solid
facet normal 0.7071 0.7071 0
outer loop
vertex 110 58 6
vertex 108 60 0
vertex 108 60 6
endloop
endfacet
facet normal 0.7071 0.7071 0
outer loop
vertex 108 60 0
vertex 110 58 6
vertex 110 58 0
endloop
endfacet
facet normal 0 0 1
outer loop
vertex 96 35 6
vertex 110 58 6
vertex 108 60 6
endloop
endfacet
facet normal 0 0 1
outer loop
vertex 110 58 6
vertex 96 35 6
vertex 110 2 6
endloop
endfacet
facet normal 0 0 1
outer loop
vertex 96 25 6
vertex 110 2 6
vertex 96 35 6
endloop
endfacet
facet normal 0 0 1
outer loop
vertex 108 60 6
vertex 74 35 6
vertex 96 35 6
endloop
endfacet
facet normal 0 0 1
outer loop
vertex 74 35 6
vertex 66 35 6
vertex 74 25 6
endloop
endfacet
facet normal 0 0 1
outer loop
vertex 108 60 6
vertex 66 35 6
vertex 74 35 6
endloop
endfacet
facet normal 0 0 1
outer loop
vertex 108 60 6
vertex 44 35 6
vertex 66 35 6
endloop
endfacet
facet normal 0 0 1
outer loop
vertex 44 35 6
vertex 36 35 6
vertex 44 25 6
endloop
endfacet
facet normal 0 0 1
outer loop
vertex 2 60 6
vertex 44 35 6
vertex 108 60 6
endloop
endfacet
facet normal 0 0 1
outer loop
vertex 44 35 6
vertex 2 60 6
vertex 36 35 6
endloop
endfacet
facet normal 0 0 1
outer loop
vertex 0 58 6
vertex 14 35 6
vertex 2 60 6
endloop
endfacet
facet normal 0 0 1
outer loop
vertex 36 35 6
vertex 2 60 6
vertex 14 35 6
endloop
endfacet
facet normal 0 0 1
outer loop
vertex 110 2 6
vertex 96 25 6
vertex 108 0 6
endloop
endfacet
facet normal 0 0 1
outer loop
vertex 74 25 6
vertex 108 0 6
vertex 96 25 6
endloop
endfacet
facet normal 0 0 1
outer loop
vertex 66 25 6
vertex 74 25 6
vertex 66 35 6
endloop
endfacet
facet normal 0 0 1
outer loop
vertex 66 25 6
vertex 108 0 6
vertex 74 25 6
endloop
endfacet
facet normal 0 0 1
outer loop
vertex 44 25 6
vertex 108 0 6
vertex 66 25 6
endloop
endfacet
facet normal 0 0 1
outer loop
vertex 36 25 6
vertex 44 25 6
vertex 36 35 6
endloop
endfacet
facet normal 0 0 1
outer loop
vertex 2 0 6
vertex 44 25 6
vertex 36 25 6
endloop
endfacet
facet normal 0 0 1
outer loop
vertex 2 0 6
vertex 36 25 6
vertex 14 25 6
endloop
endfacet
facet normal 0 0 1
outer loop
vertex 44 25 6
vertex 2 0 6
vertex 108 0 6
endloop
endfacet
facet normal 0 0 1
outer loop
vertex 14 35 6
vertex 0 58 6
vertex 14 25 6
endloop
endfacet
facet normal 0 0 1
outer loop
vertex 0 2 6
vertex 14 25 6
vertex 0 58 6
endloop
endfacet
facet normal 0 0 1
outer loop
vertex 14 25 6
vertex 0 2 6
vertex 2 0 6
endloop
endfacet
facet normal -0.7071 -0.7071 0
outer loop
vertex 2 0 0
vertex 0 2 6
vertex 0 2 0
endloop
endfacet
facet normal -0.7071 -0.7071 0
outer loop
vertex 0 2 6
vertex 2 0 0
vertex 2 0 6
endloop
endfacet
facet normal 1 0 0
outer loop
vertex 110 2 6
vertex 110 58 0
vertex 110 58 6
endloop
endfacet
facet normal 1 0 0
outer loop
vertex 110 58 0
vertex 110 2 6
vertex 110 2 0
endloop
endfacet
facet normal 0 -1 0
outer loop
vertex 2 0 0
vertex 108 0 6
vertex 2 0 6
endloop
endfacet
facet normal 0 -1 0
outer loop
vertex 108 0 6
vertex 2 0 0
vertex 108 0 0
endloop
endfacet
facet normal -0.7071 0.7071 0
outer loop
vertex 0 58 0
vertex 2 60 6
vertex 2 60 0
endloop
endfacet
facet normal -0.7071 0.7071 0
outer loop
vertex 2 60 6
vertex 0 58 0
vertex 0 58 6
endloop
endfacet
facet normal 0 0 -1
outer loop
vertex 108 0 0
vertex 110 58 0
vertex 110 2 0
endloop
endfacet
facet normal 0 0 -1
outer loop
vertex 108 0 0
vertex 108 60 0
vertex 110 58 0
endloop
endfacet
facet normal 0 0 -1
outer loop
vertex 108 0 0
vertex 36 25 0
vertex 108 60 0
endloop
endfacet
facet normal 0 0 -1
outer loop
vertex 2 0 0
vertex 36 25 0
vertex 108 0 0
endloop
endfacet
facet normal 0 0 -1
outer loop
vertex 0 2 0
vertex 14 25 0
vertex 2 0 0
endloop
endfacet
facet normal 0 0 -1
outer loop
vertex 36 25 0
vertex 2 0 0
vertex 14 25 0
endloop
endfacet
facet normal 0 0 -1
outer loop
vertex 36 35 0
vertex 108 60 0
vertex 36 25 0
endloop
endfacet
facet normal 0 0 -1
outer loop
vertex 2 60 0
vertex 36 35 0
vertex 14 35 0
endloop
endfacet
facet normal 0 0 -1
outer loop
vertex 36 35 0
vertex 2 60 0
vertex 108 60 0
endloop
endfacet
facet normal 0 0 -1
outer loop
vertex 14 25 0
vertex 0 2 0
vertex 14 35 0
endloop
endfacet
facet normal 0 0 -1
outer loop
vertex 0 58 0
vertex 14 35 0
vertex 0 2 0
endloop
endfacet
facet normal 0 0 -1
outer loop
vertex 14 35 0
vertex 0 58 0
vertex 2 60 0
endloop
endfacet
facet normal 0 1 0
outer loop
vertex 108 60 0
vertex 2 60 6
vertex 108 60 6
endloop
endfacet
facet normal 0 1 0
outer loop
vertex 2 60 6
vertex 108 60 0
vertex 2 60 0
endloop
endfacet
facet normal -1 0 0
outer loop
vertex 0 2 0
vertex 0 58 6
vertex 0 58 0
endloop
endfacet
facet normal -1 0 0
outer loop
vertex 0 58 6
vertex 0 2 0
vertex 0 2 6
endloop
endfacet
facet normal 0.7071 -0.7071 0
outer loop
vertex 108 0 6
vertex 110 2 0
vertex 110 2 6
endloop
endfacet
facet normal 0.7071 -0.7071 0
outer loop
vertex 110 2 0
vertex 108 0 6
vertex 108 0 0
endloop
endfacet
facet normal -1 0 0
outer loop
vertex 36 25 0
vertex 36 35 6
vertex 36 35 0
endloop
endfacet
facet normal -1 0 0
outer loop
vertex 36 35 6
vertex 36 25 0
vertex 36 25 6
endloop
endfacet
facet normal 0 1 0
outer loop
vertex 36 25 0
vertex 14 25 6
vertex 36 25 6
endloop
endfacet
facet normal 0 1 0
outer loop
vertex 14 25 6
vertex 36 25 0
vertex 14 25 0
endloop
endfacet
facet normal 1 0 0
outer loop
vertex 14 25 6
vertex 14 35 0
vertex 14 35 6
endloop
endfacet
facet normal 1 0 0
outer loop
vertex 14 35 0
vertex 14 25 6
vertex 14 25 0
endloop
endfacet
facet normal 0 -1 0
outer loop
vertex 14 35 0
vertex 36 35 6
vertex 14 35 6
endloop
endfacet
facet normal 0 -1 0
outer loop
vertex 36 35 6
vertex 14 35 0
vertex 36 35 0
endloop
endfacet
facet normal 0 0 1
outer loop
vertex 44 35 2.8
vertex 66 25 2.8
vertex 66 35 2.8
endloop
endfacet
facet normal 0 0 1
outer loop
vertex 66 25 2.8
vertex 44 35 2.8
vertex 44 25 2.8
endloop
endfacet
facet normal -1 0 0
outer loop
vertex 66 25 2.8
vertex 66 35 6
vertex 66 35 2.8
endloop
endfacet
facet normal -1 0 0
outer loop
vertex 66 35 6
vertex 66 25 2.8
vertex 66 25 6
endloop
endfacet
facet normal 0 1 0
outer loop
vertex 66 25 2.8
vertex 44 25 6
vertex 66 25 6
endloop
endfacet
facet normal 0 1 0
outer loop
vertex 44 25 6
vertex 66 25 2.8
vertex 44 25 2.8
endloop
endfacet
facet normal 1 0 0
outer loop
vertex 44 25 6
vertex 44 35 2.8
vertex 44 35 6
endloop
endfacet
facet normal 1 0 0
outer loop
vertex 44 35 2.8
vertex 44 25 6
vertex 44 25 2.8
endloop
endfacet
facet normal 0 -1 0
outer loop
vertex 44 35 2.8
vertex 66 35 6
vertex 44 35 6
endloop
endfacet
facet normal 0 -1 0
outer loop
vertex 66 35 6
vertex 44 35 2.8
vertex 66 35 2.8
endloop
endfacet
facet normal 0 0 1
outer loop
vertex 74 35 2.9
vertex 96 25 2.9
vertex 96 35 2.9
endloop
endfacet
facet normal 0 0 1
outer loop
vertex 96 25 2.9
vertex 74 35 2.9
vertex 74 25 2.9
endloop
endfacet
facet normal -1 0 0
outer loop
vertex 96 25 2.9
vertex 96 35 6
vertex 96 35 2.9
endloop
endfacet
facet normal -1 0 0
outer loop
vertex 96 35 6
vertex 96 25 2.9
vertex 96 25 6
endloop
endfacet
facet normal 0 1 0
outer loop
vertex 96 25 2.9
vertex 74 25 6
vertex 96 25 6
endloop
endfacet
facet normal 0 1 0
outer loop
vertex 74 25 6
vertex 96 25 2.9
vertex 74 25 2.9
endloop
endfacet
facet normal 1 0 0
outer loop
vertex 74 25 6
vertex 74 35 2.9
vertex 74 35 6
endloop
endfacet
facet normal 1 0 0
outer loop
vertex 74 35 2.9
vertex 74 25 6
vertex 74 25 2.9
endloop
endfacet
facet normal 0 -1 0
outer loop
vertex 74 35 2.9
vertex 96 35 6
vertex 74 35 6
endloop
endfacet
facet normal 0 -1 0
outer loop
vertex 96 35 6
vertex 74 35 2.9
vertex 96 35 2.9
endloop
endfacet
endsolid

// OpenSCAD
$fn = 32;

// ----------------------------------------------------------------------
// Windowed plate: 3 voids, 110 x 60 x 6 mm
// ----------------------------------------------------------------------

// --- parameters (mm) ---
plate_l = 110;            // plate length, X
plate_w = 60;             // plate width, Y
plate_t = 6;              // plate thickness, Z
edge_margin = 10;         // wall from the plate edge to any window
windows = 3;              // number of windows in the row
win_l = 22;               // window length
win_w = 10;               // window width
win_pitch = 30;           // window pitch along X
depth_1 = 6;              // depth of void 1 (full thickness = through)
depth_2 = 3.2;            // depth of void 2 (full thickness = through)
depth_3 = 3.1;            // depth of void 3 (full thickness = through)
corner_c = 2;             // corner chamfer of the plate

profile = [[2, 0], [108, 0], [110, 2], [110, 58], [108, 60], [2, 60], [0, 58], [0, 2]];  // primary outline, 8 points, counter clockwise
void_1 = [[14, 25], [36, 25], [36, 35], [14, 35]];  // window 1 of the row, 4 points
void_2 = [[44, 25], [66, 25], [66, 35], [44, 35]];  // window 2 of the row, 4 points
void_3 = [[74, 25], [96, 25], [96, 35], [74, 35]];  // window 3 of the row, 4 points

// --- the one profile operation ---
difference() {
  linear_extrude(height = plate_t) polygon(points = profile);
  translate([0, 0, -1])
    linear_extrude(height = plate_t + 2) polygon(points = void_1);
  translate([0, 0, plate_t - depth_2])
    linear_extrude(height = depth_2 + 1) polygon(points = void_2);
  translate([0, 0, plate_t - depth_3])
    linear_extrude(height = depth_3 + 1) polygon(points = void_3);
}
